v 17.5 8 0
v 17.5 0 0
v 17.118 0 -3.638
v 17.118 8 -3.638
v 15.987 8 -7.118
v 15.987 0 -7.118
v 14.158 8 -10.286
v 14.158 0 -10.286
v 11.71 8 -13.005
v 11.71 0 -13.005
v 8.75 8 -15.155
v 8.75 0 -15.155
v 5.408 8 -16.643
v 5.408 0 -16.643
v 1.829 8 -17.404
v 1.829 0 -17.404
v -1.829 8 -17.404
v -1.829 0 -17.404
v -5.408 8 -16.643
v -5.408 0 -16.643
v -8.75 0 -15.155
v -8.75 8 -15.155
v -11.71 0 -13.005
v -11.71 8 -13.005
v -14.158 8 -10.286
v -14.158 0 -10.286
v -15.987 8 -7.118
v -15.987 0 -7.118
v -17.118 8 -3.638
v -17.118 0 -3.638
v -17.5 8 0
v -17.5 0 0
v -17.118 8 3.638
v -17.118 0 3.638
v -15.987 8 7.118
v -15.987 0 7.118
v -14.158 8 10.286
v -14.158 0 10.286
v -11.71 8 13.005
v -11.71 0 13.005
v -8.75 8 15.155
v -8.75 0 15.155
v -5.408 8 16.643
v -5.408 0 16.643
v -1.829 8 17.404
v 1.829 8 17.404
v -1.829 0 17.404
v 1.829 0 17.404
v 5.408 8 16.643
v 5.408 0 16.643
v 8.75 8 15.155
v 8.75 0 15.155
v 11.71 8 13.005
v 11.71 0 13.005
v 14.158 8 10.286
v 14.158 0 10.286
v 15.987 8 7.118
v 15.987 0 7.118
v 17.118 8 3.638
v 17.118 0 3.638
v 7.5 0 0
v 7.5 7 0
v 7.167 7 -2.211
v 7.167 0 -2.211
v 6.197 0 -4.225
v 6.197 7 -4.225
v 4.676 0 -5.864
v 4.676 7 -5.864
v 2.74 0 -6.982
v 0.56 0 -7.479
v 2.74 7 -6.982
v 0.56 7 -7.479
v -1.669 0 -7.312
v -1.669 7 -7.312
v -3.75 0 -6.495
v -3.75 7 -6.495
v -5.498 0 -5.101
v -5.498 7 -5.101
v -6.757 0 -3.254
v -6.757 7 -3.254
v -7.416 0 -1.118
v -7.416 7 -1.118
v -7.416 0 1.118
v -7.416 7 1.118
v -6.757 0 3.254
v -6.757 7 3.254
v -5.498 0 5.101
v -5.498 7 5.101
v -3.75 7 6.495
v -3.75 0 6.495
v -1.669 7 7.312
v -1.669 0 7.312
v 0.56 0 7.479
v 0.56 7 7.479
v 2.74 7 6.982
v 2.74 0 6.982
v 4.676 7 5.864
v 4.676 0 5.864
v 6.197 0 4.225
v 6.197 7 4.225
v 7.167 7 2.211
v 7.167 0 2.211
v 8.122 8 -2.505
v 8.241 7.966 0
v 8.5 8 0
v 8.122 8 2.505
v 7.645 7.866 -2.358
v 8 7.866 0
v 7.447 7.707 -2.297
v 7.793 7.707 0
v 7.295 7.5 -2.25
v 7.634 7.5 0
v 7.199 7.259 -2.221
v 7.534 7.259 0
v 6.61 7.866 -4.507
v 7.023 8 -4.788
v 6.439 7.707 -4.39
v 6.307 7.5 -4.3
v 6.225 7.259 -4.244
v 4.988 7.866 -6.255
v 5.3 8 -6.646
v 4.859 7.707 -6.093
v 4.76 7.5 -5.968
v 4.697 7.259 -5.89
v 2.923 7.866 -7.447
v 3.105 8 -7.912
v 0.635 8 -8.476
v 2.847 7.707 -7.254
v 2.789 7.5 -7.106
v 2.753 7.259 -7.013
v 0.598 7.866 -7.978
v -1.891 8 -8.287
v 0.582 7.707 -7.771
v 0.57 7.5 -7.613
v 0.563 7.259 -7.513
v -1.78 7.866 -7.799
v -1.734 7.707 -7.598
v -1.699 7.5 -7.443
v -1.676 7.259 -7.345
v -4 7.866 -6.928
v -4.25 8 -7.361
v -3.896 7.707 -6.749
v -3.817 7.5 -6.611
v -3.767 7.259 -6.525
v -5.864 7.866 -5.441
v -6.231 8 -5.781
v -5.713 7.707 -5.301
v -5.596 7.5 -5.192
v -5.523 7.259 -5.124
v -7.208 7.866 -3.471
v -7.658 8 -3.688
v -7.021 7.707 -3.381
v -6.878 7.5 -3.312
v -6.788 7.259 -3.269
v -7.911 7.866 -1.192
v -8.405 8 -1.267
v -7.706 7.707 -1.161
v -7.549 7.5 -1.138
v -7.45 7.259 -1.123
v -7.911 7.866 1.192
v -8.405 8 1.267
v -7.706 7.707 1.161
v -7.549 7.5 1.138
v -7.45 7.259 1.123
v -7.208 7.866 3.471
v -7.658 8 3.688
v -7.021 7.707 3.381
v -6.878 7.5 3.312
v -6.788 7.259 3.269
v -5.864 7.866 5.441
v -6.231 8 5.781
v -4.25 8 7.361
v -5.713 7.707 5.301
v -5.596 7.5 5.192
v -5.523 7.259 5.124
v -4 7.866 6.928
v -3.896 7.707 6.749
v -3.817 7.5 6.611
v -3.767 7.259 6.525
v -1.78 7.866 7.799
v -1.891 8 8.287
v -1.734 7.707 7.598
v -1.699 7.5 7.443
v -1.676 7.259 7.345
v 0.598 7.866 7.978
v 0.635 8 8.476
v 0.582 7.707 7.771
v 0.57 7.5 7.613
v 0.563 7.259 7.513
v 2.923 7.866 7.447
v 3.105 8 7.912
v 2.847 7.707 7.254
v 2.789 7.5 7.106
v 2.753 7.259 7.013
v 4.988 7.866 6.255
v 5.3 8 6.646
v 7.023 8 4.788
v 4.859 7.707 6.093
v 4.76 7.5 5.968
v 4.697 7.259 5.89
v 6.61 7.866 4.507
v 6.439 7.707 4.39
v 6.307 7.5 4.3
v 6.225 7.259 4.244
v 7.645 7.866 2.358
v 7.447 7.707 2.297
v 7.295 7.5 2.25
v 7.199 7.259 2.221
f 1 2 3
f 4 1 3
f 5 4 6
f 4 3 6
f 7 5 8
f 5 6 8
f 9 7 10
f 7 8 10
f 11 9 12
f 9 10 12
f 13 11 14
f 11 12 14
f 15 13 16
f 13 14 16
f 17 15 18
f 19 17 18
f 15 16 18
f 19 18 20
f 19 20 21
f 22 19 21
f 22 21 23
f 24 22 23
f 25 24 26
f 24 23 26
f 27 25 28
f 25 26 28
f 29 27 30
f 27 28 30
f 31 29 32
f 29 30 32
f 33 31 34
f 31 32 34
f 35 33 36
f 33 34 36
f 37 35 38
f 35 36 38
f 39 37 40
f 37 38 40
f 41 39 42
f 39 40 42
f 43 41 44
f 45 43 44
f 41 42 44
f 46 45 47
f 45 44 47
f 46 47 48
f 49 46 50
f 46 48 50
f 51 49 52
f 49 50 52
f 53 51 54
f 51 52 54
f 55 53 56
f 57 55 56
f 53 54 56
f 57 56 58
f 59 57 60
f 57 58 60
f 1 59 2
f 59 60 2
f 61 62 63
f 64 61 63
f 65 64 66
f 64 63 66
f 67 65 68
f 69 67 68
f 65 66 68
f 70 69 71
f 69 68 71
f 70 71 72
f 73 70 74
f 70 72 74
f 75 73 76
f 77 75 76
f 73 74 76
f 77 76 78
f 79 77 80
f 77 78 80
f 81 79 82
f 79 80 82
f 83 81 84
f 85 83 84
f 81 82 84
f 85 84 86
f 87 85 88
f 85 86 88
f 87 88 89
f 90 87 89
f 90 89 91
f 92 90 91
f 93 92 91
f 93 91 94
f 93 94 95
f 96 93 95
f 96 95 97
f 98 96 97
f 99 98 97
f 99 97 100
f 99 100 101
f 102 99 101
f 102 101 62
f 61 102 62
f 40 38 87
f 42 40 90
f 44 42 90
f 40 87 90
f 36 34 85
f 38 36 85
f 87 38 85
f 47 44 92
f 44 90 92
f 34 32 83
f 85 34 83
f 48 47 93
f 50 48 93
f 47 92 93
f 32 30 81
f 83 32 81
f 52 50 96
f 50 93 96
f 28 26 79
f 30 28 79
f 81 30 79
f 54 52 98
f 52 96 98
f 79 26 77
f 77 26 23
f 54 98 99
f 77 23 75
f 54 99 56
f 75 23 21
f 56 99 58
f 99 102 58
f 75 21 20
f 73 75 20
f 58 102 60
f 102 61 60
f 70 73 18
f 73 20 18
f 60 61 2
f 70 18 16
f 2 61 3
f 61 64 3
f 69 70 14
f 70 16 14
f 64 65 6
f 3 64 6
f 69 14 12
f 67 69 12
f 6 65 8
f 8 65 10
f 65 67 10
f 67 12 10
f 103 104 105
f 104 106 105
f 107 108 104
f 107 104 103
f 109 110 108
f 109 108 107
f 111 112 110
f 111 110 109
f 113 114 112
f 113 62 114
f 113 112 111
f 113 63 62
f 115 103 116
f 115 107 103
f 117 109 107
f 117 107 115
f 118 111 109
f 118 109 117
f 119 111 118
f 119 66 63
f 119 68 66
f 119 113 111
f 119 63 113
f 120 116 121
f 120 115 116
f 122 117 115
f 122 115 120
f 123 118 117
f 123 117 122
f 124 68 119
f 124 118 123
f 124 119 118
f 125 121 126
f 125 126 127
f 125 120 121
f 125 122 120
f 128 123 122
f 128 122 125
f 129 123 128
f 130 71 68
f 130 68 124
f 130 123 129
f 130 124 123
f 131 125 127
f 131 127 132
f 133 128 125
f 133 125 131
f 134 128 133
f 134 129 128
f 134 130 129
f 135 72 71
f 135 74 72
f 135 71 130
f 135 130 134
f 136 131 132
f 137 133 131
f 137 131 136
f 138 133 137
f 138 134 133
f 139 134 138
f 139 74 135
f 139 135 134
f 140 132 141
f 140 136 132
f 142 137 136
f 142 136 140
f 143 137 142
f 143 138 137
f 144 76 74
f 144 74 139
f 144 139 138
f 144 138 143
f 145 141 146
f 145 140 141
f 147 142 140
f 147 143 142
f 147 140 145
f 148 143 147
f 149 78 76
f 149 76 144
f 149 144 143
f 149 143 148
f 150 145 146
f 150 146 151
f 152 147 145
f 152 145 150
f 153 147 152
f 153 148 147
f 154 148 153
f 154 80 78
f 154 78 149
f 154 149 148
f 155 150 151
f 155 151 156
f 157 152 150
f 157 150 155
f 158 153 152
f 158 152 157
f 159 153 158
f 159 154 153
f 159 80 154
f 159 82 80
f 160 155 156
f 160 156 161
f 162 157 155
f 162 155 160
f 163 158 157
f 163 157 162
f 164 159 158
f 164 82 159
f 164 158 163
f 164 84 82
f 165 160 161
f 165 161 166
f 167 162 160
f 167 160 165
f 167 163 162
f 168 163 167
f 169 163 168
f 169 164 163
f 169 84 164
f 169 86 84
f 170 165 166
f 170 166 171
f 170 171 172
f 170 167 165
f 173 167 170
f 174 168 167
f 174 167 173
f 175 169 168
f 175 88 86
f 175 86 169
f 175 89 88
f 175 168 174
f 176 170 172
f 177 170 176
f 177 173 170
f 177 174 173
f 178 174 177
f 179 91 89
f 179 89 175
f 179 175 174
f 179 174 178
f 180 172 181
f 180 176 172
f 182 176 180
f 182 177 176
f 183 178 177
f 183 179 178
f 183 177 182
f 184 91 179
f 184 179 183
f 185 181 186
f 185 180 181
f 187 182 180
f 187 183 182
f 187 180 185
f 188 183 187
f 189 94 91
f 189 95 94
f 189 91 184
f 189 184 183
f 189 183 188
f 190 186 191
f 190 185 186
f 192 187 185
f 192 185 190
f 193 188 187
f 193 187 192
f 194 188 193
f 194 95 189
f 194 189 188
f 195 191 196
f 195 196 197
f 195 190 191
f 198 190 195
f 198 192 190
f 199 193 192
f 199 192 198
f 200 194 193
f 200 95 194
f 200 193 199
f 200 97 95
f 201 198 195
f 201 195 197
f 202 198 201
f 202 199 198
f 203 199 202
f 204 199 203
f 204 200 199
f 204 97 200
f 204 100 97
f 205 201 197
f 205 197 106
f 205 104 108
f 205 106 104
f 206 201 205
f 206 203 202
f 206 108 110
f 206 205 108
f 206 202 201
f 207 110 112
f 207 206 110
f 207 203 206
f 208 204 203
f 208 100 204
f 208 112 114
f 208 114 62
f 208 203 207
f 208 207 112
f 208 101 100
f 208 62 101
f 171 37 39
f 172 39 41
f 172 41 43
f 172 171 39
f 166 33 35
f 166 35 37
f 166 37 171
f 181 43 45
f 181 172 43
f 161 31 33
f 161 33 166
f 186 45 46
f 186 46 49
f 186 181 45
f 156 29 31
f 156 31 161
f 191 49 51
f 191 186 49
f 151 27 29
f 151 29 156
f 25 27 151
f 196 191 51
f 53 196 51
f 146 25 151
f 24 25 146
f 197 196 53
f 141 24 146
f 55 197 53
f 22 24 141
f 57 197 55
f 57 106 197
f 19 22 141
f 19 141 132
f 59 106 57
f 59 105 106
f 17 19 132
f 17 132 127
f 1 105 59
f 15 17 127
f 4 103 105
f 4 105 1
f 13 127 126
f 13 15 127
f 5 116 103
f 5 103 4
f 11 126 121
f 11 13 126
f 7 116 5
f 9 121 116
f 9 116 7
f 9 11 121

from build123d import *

# Parameters (mm, degrees)
SKETCH1_R           = 17.5
BOSS_EXTRUDE1_DEPTH = 8
SKETCH2_R           = 7.5
CUT_EXTRUDE1_DEPTH  = 9
FILLET1_R           = 1


with BuildPart() as part:
    # Sketch1 → Boss-Extrude1 (new body)
    with BuildSketch(Plane(origin=(0, 0, 0), x_dir=(1, 0, 0), z_dir=(0, 1, 0))):
        Circle(SKETCH1_R)
    extrude(amount=BOSS_EXTRUDE1_DEPTH)

    # Sketch2 → Cut-Extrude1 (cut, through all)
    with BuildSketch(Plane(origin=(0, 8, 0), x_dir=(1, 0, 0), z_dir=(0, 1, 0))):
        Circle(SKETCH2_R)
    extrude(amount=-CUT_EXTRUDE1_DEPTH, mode=Mode.SUBTRACT)

    # Fillet1
    fillet1_edges = [part.edges().sort_by_distance(p)[0] for p in [
        (-7.5, 8, 0),
    ]]
    fillet(fillet1_edges, radius=FILLET1_R)


solid = part.part
